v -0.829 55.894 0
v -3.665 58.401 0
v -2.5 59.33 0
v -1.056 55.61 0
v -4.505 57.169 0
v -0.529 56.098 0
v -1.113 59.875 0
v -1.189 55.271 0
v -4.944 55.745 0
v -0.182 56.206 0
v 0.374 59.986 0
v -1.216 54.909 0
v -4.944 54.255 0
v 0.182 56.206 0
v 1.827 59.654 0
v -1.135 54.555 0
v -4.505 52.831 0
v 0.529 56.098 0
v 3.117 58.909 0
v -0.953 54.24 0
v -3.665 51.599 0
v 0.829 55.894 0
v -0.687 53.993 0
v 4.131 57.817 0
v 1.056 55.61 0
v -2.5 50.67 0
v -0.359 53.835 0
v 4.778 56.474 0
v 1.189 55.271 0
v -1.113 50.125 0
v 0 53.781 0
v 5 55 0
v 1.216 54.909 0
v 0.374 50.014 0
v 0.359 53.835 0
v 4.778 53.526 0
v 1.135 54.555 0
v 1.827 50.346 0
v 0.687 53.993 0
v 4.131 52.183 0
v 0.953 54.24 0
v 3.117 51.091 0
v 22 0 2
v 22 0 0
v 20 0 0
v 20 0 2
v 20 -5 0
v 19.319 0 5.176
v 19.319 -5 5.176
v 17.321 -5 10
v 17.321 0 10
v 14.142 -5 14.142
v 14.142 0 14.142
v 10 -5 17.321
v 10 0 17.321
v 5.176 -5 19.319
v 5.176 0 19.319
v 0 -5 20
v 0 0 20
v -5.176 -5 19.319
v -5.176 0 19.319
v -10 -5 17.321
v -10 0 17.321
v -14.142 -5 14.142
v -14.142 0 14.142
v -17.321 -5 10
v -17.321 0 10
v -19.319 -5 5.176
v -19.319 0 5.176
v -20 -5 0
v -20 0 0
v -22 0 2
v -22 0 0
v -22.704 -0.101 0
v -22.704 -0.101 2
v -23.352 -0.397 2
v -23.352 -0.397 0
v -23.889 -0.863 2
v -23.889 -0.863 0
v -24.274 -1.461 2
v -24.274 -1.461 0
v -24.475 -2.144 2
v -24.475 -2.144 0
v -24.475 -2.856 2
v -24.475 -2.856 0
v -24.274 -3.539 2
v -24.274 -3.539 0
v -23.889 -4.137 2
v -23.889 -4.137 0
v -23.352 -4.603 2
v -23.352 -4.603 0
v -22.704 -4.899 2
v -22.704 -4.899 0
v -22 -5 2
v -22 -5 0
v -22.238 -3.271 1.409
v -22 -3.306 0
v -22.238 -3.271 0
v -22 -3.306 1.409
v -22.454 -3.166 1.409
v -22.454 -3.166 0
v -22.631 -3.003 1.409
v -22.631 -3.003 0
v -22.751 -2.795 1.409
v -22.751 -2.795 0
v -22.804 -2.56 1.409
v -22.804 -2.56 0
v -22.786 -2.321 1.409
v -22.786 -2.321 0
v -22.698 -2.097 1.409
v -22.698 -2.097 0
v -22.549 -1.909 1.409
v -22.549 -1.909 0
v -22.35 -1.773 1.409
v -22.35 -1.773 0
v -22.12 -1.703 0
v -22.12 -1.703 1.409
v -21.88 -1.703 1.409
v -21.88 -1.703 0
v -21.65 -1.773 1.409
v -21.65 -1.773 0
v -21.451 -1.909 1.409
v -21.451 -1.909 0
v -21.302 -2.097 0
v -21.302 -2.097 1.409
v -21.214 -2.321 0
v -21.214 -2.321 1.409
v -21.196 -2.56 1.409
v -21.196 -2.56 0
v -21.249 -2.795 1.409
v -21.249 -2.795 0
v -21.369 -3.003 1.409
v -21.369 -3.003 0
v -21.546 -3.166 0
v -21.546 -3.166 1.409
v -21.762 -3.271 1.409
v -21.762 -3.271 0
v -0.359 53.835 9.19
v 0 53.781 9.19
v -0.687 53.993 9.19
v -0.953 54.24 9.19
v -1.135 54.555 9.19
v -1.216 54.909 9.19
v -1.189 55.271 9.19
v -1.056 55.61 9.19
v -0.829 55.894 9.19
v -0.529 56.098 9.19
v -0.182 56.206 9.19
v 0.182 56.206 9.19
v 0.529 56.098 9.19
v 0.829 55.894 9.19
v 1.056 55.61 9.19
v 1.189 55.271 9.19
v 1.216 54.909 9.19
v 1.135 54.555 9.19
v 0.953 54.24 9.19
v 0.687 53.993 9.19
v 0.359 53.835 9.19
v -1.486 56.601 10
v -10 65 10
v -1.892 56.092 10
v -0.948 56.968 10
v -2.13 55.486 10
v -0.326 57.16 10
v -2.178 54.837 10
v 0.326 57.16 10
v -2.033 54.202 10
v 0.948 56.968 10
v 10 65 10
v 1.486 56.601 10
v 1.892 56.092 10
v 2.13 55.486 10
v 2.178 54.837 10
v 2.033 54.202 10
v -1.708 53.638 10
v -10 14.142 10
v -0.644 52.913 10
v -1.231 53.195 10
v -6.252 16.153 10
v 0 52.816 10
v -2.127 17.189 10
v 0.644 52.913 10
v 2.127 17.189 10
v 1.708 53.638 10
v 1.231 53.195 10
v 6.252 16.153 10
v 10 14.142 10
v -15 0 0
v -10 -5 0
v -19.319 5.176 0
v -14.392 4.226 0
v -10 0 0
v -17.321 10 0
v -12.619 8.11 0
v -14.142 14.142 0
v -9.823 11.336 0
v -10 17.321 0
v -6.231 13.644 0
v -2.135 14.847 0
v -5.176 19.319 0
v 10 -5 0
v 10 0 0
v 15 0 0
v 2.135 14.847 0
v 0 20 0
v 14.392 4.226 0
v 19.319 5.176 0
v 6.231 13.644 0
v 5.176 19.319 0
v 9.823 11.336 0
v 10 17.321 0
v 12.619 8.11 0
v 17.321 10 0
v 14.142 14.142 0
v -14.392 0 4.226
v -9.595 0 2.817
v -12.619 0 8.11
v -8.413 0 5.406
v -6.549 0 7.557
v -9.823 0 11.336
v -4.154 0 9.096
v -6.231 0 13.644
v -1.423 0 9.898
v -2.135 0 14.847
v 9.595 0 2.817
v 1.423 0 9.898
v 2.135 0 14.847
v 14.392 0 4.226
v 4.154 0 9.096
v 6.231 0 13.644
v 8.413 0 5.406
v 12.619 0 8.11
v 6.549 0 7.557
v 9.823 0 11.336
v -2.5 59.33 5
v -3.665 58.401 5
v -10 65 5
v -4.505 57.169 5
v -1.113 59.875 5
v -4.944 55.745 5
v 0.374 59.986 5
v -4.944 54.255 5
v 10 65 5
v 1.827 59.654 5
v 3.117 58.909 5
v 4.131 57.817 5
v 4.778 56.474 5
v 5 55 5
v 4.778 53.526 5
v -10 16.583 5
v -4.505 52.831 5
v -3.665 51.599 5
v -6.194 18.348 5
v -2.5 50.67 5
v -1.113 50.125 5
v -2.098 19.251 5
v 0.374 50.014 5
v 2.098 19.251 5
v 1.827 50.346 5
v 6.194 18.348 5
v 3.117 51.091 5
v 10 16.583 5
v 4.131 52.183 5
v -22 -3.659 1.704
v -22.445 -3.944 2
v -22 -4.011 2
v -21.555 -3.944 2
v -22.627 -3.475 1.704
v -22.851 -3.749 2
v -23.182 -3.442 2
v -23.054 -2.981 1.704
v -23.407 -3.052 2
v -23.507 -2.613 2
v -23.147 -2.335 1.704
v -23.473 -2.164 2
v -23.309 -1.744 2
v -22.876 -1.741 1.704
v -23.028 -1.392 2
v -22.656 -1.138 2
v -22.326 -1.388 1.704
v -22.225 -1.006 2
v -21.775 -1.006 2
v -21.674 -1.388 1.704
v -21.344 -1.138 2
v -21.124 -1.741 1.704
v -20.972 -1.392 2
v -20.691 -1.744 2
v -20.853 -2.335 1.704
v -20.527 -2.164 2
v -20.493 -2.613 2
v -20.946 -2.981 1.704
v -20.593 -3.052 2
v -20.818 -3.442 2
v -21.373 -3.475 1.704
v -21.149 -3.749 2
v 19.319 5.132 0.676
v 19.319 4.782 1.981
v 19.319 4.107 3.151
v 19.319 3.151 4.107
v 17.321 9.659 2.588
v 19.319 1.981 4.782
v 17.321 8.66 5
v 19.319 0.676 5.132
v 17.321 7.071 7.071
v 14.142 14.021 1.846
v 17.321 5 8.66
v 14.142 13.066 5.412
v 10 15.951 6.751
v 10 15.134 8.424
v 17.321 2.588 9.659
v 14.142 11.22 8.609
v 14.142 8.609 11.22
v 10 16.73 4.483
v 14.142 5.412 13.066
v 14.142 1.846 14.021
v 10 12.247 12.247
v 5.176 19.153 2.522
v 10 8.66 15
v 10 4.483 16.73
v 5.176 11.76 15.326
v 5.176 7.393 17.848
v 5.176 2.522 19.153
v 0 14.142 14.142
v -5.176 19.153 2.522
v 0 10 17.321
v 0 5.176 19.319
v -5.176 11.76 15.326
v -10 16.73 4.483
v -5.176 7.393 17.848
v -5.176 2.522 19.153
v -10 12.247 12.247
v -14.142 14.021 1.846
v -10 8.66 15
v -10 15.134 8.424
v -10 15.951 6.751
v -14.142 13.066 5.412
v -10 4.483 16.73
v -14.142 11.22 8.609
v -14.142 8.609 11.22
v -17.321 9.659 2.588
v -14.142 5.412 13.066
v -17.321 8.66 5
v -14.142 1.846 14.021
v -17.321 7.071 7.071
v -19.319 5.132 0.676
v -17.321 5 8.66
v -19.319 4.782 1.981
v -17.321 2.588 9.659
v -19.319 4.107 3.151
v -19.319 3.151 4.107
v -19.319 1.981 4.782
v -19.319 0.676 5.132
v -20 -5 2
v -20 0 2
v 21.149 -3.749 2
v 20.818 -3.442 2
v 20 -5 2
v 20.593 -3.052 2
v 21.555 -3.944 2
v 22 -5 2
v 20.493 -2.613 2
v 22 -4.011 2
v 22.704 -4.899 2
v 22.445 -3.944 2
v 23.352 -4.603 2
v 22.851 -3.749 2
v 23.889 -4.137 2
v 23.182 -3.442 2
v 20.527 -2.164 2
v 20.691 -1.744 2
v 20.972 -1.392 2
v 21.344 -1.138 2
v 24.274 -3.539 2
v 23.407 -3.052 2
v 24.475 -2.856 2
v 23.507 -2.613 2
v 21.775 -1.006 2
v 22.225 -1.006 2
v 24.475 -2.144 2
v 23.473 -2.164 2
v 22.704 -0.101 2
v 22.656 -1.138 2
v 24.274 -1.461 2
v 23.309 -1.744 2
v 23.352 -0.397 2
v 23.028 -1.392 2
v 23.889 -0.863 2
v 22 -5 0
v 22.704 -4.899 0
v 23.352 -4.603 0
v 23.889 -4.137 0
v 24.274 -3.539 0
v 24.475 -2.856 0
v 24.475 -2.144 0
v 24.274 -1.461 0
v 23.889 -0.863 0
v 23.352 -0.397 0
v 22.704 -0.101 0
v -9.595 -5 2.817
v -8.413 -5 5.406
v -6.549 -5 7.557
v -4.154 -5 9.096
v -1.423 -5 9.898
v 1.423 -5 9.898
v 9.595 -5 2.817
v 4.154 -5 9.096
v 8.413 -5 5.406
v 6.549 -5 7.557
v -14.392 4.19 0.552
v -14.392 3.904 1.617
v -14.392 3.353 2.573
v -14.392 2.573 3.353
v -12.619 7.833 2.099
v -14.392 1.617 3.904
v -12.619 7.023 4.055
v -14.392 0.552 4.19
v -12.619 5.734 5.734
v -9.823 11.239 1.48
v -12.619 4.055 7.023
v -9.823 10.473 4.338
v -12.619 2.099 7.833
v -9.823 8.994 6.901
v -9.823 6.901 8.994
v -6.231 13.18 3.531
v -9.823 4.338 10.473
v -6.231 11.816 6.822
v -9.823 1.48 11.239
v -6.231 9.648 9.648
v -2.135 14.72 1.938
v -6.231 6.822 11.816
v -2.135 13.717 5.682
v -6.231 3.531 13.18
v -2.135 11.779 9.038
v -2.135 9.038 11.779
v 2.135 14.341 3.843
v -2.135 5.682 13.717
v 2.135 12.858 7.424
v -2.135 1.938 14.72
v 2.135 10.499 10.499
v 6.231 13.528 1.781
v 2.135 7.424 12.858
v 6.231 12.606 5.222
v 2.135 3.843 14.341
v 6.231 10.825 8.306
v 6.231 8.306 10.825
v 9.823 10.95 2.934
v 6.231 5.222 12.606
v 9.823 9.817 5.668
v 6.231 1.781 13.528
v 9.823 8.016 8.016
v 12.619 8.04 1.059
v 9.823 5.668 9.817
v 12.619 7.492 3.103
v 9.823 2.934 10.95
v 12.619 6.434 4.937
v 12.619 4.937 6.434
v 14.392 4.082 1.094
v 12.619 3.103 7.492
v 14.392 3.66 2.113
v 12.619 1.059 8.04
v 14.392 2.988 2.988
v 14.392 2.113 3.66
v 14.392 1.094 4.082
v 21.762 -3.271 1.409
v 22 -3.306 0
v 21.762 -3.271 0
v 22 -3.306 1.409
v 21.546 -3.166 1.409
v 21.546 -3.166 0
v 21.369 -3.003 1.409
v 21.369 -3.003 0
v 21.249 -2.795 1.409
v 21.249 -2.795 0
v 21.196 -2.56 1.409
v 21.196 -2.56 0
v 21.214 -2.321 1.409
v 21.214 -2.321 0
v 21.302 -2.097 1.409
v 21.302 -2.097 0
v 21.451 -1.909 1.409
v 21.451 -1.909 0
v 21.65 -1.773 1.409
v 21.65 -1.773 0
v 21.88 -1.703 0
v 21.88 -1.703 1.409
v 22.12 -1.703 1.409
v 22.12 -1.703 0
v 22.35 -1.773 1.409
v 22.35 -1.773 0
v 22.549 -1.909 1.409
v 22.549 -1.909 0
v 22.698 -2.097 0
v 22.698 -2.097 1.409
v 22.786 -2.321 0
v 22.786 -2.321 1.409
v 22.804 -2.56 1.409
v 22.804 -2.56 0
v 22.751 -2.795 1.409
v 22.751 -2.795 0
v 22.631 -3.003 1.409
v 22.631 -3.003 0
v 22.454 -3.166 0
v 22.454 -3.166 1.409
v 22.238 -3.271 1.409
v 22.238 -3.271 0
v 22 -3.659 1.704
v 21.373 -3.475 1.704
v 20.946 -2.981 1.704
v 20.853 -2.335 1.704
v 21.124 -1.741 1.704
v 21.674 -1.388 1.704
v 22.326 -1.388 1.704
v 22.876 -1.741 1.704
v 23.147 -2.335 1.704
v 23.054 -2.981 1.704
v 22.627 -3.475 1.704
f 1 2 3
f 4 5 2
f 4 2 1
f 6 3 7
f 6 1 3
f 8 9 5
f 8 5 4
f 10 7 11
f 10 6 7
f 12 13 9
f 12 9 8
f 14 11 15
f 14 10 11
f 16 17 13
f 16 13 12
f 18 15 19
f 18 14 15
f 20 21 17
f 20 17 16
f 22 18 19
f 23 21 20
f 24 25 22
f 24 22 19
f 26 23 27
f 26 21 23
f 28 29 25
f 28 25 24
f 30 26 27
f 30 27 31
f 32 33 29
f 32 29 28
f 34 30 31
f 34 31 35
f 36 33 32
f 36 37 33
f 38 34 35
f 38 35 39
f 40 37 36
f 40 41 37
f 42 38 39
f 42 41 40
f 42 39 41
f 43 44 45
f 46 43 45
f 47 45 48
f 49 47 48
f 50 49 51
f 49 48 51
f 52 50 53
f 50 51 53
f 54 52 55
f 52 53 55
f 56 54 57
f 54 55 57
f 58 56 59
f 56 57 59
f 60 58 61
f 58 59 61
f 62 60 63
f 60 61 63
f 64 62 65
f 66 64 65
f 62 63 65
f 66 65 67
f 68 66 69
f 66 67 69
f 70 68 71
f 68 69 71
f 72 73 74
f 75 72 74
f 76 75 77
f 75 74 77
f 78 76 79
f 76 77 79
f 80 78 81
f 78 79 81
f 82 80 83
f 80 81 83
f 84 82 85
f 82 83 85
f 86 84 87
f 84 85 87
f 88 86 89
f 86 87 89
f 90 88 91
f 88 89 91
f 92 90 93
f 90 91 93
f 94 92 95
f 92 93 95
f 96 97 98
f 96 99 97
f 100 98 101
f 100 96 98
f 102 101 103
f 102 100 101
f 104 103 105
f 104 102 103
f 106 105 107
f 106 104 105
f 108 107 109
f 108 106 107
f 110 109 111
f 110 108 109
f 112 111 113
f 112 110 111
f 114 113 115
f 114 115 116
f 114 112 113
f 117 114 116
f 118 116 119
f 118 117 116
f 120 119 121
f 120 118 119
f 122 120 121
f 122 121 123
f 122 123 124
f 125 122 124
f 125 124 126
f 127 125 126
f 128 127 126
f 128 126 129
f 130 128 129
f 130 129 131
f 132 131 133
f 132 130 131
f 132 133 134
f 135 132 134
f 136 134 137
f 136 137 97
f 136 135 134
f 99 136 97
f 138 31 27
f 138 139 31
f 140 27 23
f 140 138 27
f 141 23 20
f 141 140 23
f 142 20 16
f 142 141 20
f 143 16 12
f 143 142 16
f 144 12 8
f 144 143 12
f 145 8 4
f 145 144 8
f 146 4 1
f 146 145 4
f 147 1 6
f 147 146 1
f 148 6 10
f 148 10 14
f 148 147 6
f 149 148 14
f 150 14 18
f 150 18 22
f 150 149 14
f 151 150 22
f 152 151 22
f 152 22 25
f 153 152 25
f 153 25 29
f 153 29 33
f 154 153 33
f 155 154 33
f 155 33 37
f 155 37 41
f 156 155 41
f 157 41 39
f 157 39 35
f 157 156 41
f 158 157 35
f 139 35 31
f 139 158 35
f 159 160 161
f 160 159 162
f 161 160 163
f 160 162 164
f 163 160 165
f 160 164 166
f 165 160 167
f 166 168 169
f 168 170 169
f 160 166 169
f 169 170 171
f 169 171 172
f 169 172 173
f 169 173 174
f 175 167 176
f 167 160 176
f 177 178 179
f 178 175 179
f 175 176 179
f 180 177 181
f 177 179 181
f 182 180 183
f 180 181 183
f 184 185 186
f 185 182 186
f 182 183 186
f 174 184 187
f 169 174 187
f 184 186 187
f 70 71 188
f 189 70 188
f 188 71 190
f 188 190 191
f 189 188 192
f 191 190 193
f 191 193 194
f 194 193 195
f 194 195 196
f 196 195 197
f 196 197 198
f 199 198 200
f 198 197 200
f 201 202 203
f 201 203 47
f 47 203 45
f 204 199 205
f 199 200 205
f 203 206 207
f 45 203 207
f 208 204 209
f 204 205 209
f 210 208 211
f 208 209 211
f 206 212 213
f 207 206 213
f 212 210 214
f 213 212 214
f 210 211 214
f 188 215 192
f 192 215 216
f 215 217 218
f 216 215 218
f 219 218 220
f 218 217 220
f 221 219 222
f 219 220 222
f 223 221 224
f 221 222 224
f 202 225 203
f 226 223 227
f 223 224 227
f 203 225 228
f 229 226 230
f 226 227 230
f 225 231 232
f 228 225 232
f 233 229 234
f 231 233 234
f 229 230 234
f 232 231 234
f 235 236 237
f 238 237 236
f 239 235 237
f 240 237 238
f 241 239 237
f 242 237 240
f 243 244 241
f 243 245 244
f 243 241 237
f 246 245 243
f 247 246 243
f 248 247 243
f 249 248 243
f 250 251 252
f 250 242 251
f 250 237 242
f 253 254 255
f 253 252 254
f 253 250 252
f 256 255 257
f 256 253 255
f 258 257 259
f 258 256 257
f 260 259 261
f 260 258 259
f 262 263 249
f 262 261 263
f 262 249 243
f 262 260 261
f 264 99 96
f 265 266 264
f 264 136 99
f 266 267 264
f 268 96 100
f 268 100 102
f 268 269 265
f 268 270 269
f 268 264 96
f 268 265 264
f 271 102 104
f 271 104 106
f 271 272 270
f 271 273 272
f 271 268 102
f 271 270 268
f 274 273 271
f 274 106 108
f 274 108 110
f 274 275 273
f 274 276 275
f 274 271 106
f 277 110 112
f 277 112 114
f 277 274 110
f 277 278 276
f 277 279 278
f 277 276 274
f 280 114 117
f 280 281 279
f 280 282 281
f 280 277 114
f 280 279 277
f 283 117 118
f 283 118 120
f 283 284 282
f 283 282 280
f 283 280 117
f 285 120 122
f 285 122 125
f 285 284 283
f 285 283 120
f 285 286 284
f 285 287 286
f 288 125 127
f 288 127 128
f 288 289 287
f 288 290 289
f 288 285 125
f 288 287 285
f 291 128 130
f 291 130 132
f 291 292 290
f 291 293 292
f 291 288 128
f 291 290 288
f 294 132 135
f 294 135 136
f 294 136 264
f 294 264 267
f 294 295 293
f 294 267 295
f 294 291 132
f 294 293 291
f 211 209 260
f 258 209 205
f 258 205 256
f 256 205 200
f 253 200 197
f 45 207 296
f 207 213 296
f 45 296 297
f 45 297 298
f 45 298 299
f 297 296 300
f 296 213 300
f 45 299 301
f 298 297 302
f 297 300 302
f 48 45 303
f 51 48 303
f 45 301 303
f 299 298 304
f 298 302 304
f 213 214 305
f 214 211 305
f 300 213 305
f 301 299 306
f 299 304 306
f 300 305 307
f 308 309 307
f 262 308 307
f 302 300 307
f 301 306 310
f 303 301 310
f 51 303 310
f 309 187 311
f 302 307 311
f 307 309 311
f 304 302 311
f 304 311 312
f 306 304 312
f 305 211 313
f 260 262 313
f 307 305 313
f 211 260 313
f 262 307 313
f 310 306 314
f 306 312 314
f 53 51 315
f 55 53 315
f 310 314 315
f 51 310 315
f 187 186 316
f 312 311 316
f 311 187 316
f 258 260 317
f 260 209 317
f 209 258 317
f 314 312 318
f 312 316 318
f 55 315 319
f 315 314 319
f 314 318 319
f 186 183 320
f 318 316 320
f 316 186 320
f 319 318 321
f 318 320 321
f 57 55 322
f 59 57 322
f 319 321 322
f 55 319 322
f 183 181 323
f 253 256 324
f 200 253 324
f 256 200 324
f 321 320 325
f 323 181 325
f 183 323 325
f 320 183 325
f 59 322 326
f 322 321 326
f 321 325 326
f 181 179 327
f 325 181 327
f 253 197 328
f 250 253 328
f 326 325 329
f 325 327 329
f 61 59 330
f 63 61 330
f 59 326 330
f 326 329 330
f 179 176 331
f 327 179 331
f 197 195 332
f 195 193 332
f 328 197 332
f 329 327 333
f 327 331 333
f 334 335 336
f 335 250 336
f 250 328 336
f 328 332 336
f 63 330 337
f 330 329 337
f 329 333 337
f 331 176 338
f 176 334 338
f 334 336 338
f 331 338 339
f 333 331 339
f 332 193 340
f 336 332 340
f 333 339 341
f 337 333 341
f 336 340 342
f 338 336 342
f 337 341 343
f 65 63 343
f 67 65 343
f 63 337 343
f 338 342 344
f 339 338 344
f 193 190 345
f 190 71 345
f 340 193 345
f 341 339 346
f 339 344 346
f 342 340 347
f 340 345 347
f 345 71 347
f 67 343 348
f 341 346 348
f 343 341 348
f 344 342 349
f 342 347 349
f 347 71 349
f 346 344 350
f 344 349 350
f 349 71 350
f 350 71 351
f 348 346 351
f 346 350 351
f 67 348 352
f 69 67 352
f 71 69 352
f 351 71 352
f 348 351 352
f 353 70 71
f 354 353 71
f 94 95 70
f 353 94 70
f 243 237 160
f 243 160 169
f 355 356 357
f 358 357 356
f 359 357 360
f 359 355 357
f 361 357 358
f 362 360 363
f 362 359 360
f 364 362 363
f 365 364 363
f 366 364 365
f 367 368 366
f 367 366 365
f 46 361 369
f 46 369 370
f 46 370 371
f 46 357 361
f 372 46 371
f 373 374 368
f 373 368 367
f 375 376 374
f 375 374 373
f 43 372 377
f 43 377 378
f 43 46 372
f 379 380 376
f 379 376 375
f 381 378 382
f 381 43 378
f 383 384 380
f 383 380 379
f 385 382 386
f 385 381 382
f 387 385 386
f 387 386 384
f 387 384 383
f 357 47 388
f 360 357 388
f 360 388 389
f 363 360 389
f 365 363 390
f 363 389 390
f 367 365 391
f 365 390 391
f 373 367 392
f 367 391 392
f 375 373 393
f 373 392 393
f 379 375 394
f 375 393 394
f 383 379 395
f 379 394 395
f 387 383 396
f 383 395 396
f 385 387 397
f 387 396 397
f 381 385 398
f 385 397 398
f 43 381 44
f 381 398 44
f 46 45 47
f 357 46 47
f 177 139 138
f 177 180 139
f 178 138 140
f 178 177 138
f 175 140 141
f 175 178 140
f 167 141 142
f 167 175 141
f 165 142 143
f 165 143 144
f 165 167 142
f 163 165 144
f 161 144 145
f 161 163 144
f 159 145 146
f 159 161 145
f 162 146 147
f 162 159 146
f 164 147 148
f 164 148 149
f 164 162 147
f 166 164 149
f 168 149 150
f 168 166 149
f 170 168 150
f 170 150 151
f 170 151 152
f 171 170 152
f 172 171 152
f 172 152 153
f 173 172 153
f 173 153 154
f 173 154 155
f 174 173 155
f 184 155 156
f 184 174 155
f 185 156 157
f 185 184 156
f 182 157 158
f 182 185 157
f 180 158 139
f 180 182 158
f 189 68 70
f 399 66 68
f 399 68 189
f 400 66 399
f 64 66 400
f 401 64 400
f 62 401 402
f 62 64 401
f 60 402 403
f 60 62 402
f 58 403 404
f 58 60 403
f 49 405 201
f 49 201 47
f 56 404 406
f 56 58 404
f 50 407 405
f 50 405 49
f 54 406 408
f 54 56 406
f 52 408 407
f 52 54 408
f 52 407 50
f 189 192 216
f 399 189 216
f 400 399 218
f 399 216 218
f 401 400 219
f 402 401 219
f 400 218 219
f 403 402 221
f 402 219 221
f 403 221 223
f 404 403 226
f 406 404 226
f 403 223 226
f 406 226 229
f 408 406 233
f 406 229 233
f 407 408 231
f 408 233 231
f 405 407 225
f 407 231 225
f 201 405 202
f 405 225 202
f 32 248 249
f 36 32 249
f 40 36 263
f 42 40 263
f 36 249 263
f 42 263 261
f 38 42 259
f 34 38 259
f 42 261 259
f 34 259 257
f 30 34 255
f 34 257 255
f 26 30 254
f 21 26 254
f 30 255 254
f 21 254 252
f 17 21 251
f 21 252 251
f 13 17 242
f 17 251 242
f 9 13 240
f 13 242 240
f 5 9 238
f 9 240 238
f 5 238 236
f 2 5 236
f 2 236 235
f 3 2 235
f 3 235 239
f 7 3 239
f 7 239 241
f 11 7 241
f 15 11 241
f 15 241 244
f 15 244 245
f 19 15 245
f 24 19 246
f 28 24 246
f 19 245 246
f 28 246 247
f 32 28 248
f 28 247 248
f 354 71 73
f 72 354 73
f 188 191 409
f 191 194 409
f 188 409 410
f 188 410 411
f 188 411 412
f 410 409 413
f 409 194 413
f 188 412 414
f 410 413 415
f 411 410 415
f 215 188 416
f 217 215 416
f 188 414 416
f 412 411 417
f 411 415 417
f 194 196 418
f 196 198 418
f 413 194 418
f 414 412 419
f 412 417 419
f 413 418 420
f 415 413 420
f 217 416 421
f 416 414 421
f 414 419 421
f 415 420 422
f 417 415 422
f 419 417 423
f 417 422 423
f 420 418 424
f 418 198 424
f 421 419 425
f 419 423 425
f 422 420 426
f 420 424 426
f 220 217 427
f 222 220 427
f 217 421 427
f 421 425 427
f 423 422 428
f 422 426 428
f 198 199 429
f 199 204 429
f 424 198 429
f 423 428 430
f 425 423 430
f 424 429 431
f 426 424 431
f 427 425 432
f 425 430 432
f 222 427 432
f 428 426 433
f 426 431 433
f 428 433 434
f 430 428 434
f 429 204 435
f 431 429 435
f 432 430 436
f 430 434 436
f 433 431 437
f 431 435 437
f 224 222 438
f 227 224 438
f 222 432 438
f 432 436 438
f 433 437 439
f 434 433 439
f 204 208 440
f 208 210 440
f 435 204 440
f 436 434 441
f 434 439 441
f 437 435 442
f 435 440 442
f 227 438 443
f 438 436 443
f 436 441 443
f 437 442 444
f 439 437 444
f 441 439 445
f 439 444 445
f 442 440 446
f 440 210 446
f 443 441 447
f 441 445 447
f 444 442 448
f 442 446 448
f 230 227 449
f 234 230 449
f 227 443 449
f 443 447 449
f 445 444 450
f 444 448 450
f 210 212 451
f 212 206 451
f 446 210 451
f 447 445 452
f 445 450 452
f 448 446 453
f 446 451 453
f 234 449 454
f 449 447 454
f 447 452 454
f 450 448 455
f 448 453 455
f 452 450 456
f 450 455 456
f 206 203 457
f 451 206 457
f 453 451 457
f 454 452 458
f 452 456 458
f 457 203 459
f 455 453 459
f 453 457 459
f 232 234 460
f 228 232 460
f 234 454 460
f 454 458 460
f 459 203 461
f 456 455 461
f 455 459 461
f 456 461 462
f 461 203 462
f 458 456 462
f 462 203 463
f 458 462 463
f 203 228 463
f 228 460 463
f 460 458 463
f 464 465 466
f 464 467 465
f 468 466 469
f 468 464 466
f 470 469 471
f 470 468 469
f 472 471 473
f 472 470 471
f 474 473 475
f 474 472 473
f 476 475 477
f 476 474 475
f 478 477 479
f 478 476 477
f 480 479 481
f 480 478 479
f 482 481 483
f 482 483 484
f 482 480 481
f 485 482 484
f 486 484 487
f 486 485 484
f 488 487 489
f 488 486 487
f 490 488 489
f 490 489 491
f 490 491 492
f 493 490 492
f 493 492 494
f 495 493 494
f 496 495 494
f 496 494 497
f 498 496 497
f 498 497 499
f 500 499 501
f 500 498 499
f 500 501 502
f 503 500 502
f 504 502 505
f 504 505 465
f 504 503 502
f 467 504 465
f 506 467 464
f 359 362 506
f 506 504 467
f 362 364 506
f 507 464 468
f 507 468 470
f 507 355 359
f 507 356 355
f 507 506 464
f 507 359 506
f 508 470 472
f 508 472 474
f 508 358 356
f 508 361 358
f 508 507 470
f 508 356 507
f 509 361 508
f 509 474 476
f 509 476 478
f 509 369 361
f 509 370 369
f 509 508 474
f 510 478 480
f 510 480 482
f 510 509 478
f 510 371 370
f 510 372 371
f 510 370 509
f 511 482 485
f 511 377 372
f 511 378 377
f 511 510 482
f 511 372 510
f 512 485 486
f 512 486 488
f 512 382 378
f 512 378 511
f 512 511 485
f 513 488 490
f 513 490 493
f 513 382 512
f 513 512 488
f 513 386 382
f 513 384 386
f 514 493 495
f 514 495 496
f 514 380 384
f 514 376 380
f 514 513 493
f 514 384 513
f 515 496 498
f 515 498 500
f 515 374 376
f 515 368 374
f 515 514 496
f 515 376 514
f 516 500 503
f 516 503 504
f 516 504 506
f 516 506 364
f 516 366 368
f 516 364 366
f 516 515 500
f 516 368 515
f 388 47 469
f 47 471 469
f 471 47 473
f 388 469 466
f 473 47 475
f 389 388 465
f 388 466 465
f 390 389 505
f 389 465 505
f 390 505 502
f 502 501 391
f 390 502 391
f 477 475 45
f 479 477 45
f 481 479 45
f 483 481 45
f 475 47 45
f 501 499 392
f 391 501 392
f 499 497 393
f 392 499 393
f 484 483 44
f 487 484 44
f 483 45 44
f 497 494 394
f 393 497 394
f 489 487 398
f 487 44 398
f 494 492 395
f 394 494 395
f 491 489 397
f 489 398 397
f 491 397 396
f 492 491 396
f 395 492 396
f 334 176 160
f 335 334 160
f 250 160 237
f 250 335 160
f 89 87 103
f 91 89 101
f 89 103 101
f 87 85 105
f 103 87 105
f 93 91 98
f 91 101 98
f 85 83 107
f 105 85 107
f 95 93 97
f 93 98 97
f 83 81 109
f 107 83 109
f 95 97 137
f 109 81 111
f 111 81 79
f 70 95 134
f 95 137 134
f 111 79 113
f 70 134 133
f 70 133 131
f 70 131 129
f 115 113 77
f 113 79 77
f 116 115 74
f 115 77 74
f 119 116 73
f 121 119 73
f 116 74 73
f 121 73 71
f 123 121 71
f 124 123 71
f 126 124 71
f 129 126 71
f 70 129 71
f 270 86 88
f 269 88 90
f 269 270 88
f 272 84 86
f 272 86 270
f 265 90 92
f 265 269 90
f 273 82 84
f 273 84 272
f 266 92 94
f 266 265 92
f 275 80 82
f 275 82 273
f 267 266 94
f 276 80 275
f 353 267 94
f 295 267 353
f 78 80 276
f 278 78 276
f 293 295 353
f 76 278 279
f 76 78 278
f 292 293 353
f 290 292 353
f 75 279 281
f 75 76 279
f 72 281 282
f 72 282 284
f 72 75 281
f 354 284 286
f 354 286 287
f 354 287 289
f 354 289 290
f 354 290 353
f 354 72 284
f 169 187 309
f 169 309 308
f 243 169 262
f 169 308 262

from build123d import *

# Parameters (mm, degrees)
REVOLVE2_ANGLE                            = 90
BOSS_EXTRUDE2_DEPTH                       = 5
BOSS_EXTRUDE3_DEPTH                       = 2
BOSS_EXTRUDE3_2_DEPTH                     = 2
CSK_FOR_0_FLAT_HEAD_MACHINE_SCREW_2_COUNT = 2
CSK_FOR_0_FLAT_HEAD_MACHINE_SCREW_2_PITCH = 44
BOSS_EXTRUDE4_START                       = 14.142136
SKETCH10_W                                = 20
SKETCH10_H                                = 5
BOSS_EXTRUDE4_DEPTH                       = 50.857864
SKETCH11_R                                = 5
BOSS_EXTRUDE6_DEPTH                       = 5


with BuildPart() as part:
    # Sketch1 → Revolve2 (revolve)
    with BuildSketch(Plane.XY):
        with BuildLine():
            Line((-20, 0), (-15, 0))
            ThreePointArc((-15, 0), (0, 15), (15, 0))
            Line((15, 0), (20, 0))
            ThreePointArc((20, 0), (0, 20), (-20, 0))
        make_face()
    revolve(axis=Axis((10, 0, 0), (1, 0, 0)), revolution_arc=REVOLVE2_ANGLE)

    # Sketch3 → Boss-Extrude2 (add)
    with BuildSketch(Plane.XZ):
        with BuildLine():
            Line((-20, 0), (-10, 0))
            ThreePointArc((-10, 0), (0, 10), (10, 0))
            Line((10, 0), (20, 0))
            ThreePointArc((20, 0), (0, 20), (-20, 0))
        make_face()
    extrude(amount=BOSS_EXTRUDE2_DEPTH)

    # Sketch10 → Boss-Extrude4 (add)
    with BuildSketch(Plane(origin=(0, 0, 0), x_dir=(1, 0, 0), z_dir=(0, 1, 0)).offset(BOSS_EXTRUDE4_START)):
        with Locations((0, -7.5)):
            Rectangle(SKETCH10_W, SKETCH10_H)
    extrude(amount=BOSS_EXTRUDE4_DEPTH)

    # Sketch11 → Boss-Extrude6 (add)
    with BuildSketch(Plane(origin=(0, 0, 5), x_dir=(-1, 0, 0), z_dir=(0, 0, -1))):
        with Locations(Location((0, 55, 0), (0, 0, 180))):
            Circle(SKETCH11_R)
    extrude(amount=BOSS_EXTRUDE6_DEPTH)

    # Sketch15 → CSK for #2 Flat Head Machine Screw (100)1 (revolve, cut)
    with BuildSketch(Plane(origin=(0, 55, 10), x_dir=(0, -1, 0), z_dir=(1, 0, 0))):
        Polygon((0, 0), (0, 10), (1.2192, 10), (1.2192, 0.809898964), (2.1844, 0), align=None)
    revolve(axis=Axis((0, 55, 16.35), (0, 0, -1)), mode=Mode.SUBTRACT)


with BuildPart() as body_2:
    # Sketch5 → Boss-Extrude3 (new body)
    with BuildSketch(Plane(origin=(0, 0, 0), x_dir=(-1, 0, 0), z_dir=(0, 0, -1))):
        with BuildLine():
            Line((-22, 0), (-20, 0))
            Line((-20, 0), (-20, -5))
            Line((-20, -5), (-22, -5))
            ThreePointArc((-22, -5), (-24.5, -2.5), (-22, 0))
        make_face()
    extrude(amount=-BOSS_EXTRUDE3_DEPTH)

    # Sketch9 → CSK for #0 Flat Head Machine Screw (100)3 (revolve, cut)
    with BuildSketch(Plane(origin=(22, -2.5, 2), x_dir=(0, -1, 0), z_dir=(1, 0, 0))):
        Polygon((0, 0), (0, 2), (0.80645, 2), (0.80645, 0.591439375), (1.5113, 0), align=None)
    csk_for_0_flat_head_machine_screw_100 = revolve(axis=Axis((22, -2.5, 8.35), (0, 0, -1)), mode=Mode.SUBTRACT)


with BuildPart() as body_3:
    # Sketch5 → Boss-Extrude3 2 (new body)
    with BuildSketch(Plane(origin=(0, 0, 0), x_dir=(-1, 0, 0), z_dir=(0, 0, -1))):
        with BuildLine():
            Line((22, -5), (20, -5))
            Line((20, -5), (20, 0))
            Line((20, 0), (22, 0))
            ThreePointArc((22, 0), (24.5, -2.5), (22, -5))
        make_face()
    extrude(amount=-BOSS_EXTRUDE3_2_DEPTH)

    # CSK for _0 Flat Head Machine Screw _ 2: CSK for #0 Flat Head Machine Screw (100)3 ×2
    with Locations(*[(-i * CSK_FOR_0_FLAT_HEAD_MACHINE_SCREW_2_PITCH, 0, 0) for i in range(1, CSK_FOR_0_FLAT_HEAD_MACHINE_SCREW_2_COUNT)]):
        add(csk_for_0_flat_head_machine_screw_100, mode=Mode.SUBTRACT)


solid = Compound([part.part, body_2.part, body_3.part])
